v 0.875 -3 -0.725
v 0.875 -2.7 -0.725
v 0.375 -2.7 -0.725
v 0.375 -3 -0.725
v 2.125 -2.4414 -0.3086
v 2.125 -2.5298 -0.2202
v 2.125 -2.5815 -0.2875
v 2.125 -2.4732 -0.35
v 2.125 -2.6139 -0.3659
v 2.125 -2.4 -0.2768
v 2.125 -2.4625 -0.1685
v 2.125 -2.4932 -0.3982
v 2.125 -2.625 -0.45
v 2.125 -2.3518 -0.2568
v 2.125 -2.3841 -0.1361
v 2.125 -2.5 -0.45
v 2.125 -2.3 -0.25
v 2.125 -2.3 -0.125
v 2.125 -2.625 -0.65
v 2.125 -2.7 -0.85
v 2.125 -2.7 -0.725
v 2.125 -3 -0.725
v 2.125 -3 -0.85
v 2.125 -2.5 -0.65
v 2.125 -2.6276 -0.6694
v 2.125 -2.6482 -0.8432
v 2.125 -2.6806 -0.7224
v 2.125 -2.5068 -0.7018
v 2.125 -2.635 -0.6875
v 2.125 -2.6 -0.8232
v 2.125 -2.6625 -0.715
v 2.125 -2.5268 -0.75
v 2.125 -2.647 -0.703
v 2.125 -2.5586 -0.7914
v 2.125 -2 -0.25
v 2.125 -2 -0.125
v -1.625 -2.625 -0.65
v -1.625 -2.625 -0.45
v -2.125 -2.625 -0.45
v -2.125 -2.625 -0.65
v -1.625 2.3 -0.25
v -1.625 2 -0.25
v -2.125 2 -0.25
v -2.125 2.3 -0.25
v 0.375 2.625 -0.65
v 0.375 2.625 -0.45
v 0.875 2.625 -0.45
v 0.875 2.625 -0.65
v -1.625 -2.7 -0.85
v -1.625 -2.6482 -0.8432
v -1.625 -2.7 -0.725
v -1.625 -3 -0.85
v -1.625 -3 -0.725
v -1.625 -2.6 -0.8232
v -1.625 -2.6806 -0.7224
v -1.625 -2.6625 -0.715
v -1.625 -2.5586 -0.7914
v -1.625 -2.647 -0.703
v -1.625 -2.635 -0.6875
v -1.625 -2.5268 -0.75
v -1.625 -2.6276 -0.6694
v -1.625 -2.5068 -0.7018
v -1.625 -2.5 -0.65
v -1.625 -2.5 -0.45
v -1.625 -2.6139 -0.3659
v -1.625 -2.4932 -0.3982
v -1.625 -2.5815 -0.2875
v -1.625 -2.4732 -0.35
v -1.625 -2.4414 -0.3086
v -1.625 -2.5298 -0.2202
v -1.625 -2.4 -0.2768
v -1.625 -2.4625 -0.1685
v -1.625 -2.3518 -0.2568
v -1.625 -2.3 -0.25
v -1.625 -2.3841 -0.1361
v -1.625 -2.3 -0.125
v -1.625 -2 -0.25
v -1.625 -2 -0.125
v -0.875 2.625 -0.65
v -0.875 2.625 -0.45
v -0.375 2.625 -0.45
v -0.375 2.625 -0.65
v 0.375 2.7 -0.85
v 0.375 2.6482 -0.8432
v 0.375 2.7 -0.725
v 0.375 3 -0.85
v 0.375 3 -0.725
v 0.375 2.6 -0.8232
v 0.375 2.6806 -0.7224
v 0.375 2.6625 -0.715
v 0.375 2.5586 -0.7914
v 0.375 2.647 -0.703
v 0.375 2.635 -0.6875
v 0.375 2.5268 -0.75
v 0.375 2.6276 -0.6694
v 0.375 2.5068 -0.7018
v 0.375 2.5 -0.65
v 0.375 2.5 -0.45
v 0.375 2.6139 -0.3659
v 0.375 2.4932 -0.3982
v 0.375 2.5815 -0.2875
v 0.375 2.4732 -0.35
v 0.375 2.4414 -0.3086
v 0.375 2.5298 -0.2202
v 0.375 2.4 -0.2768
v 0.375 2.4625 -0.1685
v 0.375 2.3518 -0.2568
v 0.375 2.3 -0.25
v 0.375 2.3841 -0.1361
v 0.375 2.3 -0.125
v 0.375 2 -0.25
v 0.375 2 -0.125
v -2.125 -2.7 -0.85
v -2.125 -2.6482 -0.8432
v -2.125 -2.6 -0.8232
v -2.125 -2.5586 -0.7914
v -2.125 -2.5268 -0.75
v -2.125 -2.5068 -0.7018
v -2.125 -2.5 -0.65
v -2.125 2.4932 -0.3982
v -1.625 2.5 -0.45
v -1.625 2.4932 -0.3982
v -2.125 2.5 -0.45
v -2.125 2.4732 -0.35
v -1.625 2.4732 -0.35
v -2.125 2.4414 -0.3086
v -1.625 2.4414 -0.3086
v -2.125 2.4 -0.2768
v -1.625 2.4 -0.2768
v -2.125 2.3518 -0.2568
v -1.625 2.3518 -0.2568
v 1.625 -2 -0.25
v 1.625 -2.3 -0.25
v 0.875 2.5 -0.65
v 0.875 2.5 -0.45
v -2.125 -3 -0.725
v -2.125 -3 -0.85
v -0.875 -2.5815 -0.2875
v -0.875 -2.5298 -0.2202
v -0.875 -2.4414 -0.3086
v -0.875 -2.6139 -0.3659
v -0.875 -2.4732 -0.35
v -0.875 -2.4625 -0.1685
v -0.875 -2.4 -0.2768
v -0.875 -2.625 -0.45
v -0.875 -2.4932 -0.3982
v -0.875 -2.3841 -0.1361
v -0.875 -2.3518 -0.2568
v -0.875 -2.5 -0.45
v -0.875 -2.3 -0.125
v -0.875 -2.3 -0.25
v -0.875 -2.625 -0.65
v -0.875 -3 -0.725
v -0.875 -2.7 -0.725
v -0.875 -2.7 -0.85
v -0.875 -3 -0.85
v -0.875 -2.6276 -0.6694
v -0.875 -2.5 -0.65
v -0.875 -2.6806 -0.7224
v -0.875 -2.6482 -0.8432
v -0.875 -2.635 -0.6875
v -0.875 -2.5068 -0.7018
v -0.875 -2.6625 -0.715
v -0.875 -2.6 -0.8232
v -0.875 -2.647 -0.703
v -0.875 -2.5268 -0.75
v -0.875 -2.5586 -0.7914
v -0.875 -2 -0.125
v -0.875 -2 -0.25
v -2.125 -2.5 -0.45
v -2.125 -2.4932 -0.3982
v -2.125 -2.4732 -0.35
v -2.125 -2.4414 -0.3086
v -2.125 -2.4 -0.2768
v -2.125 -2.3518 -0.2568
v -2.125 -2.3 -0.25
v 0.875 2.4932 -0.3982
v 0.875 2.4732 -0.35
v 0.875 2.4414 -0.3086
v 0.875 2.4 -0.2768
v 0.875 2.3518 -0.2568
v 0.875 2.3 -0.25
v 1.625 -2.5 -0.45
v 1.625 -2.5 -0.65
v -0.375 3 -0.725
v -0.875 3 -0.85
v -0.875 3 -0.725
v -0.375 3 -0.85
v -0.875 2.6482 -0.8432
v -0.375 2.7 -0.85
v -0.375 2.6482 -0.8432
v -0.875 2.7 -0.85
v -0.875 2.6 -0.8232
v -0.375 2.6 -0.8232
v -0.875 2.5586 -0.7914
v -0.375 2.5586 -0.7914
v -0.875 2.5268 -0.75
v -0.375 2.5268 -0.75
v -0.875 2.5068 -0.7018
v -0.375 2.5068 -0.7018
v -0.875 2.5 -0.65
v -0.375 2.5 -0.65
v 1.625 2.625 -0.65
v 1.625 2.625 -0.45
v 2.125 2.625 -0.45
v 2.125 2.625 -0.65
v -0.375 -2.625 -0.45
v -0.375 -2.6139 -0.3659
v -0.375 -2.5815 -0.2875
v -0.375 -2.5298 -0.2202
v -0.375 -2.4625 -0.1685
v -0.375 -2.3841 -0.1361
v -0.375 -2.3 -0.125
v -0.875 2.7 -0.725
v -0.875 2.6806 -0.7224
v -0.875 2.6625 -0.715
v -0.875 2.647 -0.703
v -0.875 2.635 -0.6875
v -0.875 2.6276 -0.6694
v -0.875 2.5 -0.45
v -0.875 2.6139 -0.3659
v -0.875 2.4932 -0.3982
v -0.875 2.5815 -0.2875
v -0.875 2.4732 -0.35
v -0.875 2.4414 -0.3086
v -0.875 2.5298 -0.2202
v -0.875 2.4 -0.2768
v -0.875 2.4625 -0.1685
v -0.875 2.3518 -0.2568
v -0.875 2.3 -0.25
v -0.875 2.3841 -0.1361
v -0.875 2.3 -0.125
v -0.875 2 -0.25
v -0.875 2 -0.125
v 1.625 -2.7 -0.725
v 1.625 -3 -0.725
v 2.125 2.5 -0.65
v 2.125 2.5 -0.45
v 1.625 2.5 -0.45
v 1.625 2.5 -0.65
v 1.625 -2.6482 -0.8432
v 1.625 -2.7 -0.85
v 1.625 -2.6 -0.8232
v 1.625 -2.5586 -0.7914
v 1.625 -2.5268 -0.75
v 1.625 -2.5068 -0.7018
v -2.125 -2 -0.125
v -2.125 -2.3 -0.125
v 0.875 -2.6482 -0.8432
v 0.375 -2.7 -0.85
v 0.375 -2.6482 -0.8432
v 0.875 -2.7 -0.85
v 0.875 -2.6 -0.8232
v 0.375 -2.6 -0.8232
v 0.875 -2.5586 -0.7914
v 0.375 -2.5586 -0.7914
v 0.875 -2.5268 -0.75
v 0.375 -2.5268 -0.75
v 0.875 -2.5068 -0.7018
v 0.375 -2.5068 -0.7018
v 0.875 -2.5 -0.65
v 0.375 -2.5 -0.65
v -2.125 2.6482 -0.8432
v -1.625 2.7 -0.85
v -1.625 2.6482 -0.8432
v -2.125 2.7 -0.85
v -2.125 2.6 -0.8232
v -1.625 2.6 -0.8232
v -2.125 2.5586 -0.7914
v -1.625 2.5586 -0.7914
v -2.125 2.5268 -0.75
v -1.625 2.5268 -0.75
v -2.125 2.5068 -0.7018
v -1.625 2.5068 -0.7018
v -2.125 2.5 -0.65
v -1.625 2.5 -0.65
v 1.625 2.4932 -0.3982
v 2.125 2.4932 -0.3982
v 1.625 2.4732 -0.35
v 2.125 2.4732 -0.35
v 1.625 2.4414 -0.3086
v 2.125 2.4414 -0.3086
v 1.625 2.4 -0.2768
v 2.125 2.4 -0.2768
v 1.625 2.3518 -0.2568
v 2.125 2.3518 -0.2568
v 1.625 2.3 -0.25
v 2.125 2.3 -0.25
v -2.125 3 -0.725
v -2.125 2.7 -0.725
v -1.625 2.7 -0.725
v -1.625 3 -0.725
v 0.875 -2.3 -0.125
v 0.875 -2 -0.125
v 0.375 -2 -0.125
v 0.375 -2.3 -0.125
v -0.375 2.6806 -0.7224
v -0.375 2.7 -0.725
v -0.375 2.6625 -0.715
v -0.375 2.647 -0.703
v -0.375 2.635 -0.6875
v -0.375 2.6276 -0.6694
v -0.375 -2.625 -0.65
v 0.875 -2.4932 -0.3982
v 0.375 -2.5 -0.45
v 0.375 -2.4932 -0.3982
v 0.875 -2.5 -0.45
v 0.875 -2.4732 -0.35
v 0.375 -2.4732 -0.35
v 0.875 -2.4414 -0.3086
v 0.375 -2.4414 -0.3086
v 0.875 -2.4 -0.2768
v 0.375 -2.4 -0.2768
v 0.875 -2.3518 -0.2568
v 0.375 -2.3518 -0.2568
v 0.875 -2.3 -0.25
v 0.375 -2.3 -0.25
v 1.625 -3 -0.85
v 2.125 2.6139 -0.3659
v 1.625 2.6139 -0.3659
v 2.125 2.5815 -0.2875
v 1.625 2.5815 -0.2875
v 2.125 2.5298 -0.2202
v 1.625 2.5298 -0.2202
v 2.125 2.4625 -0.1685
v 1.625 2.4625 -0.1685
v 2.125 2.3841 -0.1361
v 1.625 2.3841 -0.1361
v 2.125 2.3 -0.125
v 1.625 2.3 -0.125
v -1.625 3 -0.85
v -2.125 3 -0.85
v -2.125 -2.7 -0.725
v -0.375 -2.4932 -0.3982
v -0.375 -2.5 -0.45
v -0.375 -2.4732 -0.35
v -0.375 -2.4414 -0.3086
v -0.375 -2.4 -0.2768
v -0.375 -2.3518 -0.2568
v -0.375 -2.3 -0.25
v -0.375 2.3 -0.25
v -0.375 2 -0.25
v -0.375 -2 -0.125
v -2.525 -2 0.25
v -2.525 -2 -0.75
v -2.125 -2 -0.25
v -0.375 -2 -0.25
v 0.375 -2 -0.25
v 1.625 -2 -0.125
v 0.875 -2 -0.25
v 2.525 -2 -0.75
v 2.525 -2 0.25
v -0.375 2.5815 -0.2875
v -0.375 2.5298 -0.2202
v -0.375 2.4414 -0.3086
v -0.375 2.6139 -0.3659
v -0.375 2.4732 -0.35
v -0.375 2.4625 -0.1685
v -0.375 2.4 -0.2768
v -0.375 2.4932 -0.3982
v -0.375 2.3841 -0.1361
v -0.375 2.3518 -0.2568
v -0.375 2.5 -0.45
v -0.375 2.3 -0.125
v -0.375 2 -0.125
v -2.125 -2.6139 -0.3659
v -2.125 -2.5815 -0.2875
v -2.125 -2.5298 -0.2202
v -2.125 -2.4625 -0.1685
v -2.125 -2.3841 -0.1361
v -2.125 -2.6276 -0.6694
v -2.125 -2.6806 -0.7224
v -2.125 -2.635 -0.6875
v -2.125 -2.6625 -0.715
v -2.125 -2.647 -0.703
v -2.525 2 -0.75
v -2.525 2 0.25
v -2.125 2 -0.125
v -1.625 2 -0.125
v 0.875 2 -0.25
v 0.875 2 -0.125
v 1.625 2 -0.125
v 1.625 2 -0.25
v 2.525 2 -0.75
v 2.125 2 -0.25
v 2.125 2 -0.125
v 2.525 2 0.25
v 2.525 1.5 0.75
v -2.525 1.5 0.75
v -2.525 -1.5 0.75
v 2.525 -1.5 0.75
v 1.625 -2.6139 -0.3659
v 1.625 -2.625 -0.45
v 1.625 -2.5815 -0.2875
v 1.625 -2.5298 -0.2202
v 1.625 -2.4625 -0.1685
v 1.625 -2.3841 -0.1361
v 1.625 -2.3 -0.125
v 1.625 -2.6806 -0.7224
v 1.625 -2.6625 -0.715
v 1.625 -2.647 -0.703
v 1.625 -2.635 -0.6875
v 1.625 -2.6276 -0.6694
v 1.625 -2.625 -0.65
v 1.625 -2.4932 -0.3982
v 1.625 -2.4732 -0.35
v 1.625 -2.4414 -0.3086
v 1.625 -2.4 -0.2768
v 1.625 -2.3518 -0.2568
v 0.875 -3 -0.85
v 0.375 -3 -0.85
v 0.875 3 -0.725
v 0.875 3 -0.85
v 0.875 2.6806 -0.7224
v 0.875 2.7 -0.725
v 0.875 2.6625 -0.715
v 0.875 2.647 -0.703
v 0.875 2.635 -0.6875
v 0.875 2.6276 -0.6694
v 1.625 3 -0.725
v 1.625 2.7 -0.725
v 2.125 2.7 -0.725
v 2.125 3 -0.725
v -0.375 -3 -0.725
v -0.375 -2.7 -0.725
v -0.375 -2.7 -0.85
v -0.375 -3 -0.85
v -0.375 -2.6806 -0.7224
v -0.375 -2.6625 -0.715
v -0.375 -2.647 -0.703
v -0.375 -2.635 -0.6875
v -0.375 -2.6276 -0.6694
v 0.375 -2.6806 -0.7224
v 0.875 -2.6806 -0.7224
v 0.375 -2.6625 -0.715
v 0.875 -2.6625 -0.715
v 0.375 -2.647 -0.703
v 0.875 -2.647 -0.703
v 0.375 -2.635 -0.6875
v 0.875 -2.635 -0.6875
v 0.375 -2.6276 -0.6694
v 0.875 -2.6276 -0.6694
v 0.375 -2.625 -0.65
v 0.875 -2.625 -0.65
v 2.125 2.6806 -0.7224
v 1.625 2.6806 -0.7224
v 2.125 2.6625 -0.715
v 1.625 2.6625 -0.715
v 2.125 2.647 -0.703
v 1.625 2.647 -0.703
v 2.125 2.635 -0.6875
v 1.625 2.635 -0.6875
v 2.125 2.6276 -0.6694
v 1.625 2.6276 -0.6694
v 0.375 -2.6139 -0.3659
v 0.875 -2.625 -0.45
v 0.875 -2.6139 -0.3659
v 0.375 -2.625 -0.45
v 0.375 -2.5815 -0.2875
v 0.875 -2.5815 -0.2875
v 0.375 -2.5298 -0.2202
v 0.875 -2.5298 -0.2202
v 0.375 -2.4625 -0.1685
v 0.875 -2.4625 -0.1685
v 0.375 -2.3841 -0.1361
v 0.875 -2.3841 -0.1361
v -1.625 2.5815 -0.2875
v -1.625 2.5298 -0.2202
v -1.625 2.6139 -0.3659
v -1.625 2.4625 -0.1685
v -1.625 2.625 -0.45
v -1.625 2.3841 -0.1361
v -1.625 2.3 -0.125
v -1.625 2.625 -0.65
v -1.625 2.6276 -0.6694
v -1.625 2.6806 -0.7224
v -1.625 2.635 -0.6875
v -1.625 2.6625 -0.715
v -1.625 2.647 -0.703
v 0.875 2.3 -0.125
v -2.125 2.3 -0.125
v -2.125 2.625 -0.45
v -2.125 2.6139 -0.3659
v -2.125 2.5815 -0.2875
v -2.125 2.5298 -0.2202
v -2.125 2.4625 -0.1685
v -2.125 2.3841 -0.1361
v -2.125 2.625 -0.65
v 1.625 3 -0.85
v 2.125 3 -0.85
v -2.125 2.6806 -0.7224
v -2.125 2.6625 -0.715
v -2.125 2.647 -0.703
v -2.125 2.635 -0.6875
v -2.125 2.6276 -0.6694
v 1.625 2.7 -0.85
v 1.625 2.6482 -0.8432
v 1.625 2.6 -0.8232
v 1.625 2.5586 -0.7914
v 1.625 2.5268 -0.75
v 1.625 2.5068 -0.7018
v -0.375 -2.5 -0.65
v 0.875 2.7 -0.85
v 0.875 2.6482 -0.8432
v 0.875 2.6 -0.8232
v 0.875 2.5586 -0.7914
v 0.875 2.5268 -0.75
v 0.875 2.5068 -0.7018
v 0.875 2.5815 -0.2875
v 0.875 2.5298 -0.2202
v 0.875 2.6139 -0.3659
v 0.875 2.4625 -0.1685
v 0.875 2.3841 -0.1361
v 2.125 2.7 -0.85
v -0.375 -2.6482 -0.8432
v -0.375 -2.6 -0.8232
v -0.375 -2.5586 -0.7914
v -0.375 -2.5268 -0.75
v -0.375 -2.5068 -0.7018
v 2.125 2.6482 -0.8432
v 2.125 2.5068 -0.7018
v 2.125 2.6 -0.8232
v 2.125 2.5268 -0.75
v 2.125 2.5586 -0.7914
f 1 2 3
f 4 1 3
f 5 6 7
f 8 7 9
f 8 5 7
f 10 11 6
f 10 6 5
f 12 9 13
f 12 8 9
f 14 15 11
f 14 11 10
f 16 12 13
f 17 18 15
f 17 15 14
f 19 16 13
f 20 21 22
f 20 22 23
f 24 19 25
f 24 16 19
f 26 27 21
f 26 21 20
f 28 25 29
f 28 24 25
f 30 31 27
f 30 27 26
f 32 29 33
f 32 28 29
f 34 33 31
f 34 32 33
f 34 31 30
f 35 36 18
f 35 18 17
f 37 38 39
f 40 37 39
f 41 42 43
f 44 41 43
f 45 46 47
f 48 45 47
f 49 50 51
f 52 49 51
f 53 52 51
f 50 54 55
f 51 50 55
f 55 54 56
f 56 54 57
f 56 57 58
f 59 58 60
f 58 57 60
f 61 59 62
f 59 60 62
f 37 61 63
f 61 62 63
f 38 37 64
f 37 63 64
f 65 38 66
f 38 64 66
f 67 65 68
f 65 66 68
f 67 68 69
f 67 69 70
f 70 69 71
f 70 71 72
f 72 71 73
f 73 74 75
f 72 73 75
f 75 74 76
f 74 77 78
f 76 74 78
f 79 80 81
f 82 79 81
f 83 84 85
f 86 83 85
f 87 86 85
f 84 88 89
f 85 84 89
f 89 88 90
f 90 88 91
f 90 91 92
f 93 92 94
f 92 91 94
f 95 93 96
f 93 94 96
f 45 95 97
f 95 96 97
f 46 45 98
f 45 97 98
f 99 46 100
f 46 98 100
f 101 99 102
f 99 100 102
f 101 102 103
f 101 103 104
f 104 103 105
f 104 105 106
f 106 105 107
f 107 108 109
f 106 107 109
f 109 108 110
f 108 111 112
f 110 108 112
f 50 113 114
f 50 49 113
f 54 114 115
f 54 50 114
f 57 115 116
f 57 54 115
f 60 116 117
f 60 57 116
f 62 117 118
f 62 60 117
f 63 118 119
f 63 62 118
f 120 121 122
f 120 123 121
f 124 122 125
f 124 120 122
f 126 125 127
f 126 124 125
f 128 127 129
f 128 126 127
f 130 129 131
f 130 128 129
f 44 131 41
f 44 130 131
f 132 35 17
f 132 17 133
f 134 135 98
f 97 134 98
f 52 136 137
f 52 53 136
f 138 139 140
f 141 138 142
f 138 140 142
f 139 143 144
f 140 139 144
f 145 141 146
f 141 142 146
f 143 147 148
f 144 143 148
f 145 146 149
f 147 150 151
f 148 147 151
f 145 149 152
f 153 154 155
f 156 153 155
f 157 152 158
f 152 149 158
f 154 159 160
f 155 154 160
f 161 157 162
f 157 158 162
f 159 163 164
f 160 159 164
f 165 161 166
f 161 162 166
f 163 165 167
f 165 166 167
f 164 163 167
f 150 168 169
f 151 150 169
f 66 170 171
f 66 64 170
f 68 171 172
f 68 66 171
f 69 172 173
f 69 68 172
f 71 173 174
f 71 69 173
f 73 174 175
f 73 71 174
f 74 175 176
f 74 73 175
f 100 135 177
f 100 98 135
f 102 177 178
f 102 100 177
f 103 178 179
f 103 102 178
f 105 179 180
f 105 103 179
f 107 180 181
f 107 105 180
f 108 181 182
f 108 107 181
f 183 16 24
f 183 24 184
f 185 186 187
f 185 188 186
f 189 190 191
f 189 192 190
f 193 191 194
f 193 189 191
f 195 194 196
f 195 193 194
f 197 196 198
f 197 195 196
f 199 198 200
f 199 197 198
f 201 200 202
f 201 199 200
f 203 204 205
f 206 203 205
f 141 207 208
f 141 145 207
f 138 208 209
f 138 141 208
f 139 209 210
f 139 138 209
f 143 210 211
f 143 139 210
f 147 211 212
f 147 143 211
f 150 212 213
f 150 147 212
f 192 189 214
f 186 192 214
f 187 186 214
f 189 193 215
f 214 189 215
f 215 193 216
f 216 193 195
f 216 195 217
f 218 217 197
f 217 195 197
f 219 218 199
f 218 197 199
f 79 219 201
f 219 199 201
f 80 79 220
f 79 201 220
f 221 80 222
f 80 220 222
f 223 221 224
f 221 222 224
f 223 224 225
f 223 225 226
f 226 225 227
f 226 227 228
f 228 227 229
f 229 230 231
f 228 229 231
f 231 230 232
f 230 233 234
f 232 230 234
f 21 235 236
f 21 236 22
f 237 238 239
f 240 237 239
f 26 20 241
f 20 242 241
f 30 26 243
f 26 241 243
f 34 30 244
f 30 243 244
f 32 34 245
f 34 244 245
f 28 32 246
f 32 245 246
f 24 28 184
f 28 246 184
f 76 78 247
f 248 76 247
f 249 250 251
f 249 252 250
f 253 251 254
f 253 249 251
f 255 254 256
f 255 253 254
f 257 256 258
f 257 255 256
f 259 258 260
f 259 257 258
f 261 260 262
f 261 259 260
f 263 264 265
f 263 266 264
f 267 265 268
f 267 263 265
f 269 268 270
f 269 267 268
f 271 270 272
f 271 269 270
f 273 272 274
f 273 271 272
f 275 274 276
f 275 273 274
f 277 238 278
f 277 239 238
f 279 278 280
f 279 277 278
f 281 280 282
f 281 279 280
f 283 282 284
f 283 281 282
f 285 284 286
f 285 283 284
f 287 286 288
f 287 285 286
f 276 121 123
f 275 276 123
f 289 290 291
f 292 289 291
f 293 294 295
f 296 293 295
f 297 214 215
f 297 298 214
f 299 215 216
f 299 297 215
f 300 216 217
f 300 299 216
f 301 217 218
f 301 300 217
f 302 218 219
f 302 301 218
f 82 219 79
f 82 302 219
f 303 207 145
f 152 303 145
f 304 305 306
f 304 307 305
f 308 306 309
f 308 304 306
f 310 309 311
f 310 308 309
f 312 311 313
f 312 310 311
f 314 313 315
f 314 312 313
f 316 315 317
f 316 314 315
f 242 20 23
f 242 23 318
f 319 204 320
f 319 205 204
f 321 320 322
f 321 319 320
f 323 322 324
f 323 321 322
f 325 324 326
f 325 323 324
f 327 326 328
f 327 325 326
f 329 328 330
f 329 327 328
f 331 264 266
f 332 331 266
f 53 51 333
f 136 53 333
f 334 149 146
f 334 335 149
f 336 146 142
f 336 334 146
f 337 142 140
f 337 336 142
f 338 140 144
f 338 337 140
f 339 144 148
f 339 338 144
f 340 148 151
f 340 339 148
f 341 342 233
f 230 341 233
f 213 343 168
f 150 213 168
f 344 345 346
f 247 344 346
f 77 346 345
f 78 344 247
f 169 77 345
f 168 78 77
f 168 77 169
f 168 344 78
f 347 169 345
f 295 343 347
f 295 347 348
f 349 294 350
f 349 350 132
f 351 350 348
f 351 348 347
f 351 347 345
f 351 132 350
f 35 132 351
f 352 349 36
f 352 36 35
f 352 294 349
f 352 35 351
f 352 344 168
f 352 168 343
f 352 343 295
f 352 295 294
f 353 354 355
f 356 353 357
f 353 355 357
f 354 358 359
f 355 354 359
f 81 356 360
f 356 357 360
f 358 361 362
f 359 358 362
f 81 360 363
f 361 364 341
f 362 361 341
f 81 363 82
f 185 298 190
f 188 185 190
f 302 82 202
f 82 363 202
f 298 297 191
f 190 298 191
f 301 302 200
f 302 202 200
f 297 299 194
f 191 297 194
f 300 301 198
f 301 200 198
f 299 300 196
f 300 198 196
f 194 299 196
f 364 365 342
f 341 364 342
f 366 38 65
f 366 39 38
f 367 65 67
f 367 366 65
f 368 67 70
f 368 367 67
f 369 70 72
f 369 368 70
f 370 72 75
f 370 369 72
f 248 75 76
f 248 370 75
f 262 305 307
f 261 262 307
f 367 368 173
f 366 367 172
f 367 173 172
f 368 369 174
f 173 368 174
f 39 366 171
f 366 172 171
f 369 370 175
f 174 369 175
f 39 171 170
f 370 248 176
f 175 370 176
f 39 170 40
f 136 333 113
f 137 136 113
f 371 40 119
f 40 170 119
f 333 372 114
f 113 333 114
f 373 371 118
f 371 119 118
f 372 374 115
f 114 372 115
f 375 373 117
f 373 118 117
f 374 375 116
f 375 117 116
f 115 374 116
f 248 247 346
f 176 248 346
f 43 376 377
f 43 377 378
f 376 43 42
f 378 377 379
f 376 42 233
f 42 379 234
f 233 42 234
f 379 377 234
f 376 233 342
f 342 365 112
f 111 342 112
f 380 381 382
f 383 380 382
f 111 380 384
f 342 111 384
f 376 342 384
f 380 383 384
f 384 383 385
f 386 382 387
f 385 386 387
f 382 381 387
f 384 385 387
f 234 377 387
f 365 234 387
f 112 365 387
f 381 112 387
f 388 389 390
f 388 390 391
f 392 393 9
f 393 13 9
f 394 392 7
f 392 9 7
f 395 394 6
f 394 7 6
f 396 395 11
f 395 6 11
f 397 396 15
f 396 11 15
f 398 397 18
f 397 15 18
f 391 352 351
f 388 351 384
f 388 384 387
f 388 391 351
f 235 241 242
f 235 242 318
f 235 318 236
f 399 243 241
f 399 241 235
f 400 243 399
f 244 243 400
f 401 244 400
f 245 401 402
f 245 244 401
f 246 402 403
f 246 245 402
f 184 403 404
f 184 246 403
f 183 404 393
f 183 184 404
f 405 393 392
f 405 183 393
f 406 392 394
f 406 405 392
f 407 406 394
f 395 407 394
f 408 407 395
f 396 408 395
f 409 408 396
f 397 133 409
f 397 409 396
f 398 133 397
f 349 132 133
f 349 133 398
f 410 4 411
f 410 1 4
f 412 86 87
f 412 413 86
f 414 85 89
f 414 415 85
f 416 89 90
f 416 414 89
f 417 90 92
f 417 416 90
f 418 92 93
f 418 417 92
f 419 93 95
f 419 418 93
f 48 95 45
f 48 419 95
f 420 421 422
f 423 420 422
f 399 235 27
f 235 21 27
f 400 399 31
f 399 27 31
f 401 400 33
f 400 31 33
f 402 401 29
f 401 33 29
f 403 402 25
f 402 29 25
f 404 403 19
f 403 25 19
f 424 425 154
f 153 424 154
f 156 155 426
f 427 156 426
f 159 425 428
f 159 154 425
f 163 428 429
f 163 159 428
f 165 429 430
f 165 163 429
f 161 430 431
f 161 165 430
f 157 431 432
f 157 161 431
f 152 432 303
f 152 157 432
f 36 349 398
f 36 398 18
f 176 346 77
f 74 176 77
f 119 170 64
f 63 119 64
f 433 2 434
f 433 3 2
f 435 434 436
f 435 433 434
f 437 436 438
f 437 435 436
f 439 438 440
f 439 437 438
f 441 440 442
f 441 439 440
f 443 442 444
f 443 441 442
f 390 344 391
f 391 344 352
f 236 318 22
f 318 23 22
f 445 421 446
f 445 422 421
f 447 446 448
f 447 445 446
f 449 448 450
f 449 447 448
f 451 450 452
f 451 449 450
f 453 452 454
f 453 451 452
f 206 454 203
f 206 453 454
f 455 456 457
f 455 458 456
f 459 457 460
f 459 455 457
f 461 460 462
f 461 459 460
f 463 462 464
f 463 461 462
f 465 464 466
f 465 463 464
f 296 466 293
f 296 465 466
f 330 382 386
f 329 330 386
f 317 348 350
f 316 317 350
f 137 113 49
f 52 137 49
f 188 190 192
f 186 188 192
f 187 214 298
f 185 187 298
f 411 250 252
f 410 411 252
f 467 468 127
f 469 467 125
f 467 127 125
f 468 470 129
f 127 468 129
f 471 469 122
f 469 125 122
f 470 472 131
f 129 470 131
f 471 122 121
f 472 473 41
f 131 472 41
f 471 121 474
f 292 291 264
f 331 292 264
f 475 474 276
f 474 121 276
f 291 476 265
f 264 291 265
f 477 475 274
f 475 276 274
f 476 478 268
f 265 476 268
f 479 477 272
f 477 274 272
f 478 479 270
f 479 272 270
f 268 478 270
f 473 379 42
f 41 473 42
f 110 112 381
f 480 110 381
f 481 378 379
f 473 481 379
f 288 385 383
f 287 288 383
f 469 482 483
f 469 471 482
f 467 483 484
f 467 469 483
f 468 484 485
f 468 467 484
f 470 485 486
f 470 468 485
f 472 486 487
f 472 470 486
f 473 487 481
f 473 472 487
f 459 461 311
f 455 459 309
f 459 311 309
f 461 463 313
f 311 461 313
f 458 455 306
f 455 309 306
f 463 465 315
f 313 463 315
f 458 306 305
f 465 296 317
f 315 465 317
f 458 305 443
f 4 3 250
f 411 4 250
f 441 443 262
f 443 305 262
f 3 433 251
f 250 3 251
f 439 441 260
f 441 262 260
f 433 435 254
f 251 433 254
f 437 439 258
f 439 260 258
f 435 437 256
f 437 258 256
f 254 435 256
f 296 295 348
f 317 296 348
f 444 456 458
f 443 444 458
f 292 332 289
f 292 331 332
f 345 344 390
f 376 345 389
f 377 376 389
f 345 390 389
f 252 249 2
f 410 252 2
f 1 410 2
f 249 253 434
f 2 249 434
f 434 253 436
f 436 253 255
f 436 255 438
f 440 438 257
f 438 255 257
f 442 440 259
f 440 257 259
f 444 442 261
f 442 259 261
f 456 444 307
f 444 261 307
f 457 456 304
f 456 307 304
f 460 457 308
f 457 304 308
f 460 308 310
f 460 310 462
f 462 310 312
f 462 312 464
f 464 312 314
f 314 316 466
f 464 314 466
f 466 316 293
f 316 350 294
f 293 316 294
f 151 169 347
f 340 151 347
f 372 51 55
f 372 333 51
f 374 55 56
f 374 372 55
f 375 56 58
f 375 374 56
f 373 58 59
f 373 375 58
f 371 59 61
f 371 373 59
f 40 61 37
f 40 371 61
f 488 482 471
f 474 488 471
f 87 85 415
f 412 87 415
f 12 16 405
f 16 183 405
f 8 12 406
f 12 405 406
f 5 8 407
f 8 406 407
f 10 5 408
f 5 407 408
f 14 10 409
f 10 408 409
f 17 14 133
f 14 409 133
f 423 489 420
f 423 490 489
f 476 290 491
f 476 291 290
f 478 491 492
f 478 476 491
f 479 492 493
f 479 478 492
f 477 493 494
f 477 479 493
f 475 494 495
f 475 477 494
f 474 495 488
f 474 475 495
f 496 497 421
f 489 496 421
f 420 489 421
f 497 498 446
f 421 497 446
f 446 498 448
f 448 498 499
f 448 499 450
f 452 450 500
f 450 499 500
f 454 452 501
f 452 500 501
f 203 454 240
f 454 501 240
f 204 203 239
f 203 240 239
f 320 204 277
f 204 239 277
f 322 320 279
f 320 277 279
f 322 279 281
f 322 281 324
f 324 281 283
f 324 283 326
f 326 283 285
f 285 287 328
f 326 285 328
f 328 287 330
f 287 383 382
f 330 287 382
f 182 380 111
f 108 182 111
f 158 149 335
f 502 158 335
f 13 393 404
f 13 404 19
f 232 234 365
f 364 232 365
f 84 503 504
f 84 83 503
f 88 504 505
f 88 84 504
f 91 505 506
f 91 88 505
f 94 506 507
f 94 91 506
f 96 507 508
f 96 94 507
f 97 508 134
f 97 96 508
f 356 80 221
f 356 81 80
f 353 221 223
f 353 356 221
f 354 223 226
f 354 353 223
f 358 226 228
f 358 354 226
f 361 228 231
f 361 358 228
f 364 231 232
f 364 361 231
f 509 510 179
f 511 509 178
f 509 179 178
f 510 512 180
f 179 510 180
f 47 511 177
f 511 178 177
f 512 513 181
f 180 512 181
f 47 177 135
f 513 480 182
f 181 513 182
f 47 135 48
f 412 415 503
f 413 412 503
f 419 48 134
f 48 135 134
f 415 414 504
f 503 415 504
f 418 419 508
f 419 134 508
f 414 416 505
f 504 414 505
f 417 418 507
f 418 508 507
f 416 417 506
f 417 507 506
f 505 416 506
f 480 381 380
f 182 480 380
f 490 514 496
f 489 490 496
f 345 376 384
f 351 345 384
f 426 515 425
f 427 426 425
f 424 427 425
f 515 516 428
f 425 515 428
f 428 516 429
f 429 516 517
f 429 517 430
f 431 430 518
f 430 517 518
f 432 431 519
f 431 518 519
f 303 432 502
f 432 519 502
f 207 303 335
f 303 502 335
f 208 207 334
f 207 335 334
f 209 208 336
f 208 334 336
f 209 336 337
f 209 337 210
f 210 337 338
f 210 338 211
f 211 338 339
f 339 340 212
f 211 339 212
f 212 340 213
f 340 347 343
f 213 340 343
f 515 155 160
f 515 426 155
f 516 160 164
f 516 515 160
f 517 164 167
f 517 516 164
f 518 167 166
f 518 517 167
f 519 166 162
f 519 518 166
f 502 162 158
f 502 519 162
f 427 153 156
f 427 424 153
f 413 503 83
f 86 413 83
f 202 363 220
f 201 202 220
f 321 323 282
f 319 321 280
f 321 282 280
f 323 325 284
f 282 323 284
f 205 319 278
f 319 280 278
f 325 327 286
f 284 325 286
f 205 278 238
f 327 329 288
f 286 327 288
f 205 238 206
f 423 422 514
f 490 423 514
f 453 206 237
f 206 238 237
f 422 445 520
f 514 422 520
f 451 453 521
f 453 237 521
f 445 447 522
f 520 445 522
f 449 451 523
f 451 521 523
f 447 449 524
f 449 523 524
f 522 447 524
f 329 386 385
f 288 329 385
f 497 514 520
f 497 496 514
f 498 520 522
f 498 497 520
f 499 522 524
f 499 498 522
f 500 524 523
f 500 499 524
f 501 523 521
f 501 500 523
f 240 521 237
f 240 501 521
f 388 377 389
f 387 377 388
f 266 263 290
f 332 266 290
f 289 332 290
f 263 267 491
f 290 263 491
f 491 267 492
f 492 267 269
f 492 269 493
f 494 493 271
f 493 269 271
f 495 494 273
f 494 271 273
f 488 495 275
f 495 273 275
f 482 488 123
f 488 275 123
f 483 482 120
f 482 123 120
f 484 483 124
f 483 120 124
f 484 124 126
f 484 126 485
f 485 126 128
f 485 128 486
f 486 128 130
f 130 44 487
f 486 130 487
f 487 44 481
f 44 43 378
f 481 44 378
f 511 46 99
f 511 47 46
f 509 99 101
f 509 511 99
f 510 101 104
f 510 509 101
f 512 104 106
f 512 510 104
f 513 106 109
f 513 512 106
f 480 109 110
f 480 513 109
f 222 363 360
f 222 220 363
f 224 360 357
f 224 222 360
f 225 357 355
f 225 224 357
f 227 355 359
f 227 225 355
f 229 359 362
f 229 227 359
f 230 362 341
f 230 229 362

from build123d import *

# Parameters (mm, degrees)
SKETCH1_W               = 5.05
SKETCH1_H               = 4
EXTRUDE1_DEPTH          = 0.75
CHAMFER1_SIZE           = 0.5
SKETCH2_W               = 0.5
SKETCH2_H               = 0.125
LPATTERN1_COUNT         = 4
LPATTERN1_PITCH         = 1.25
MIRROR1_COPY_1_SKETCH_W = 0.5
MIRROR1_COPY_1_SKETCH_H = 0.125
MIRROR1_COPY_2_SKETCH_W = 0.5
MIRROR1_COPY_2_SKETCH_H = 0.125
MIRROR1_COPY_3_SKETCH_W = 0.5
MIRROR1_COPY_3_SKETCH_H = 0.125


with BuildPart() as part:
    # Sketch1 → Extrude1 (new, symmetric)
    with BuildSketch(Plane.XY):
        Rectangle(SKETCH1_W, SKETCH1_H)
    extrude(amount=EXTRUDE1_DEPTH, both=True)

    # Chamfer1
    chamfer1_edges = [part.edges().sort_by_distance(p)[0] for p in [
        (0, -2, 0.75),
        (0, 2, 0.75),
    ]]
    chamfer(chamfer1_edges, length=CHAMFER1_SIZE)

    # Sweep1: sweep along a path in Sketch3
    with BuildLine(Plane(origin=(2.125, 0, 0), x_dir=(0, 0, -1), z_dir=(1, 0, 0))) as sweep1_path:
        Line((0.85, 3), (0.85, 2.7))
        ThreePointArc((0.85, 2.7), (0.791421356, 2.558578644), (0.65, 2.5))
        Line((0.65, 2.5), (0.45, 2.5))
        ThreePointArc((0.45, 2.5), (0.308578644, 2.441421356), (0.25, 2.3))
        Line((0.25, 2.3), (0.25, 2))
    # Sketch2 → Sweep1 (sweep)
    with BuildSketch(Plane(origin=(0, 2, 0), x_dir=(1, 0, 0), z_dir=(0, 1, 0))):
        with Locations((1.875, 0.1875)):
            Rectangle(SKETCH2_W, SKETCH2_H)
    sweep1 = sweep(path=sweep1_path.line)

    # LPattern1: Sweep1 ×4
    with Locations(*[(-i * LPATTERN1_PITCH, 0, 0) for i in range(1, LPATTERN1_COUNT)]):
        add(sweep1)

    # Mirror1: Sweep1 across plane
    add(sweep1.mirror(Plane.ZX))

    # Mirror1 copy 1: sweep along a path in Mirror1 copy 1 path
    with BuildLine(Plane(origin=(0.875, 0, 0), x_dir=(0, 0, -1), z_dir=(1, 0, 0))) as mirror1_copy_1_path:
        Line((0.85, -3), (0.85, -2.7))
        ThreePointArc((0.85, -2.7), (0.791421356, -2.558578644), (0.65, -2.5))
        Line((0.65, -2.5), (0.45, -2.5))
        ThreePointArc((0.45, -2.5), (0.308578644, -2.441421356), (0.25, -2.3))
        Line((0.25, -2.3), (0.25, -2))
    # Mirror1 copy 1 sketch → Mirror1 copy 1 (sweep)
    with BuildSketch(Plane(origin=(-1.25, -2, 0), x_dir=(1, 0, 0), z_dir=(0, -1, 0))):
        with Locations((1.875, -0.1875)):
            Rectangle(MIRROR1_COPY_1_SKETCH_W, MIRROR1_COPY_1_SKETCH_H)
    sweep(path=mirror1_copy_1_path.line)

    # Mirror1 copy 2: sweep along a path in Mirror1 copy 2 path
    with BuildLine(Plane(origin=(-0.375, 0, 0), x_dir=(0, 0, -1), z_dir=(1, 0, 0))) as mirror1_copy_2_path:
        Line((0.85, -3), (0.85, -2.7))
        ThreePointArc((0.85, -2.7), (0.791421356, -2.558578644), (0.65, -2.5))
        Line((0.65, -2.5), (0.45, -2.5))
        ThreePointArc((0.45, -2.5), (0.308578644, -2.441421356), (0.25, -2.3))
        Line((0.25, -2.3), (0.25, -2))
    # Mirror1 copy 2 sketch → Mirror1 copy 2 (sweep)
    with BuildSketch(Plane(origin=(-2.5, -2, 0), x_dir=(1, 0, 0), z_dir=(0, -1, 0))):
        with Locations((1.875, -0.1875)):
            Rectangle(MIRROR1_COPY_2_SKETCH_W, MIRROR1_COPY_2_SKETCH_H)
    sweep(path=mirror1_copy_2_path.line)

    # Mirror1 copy 3: sweep along a path in Mirror1 copy 3 path
    with BuildLine(Plane(origin=(-1.625, 0, 0), x_dir=(0, 0, -1), z_dir=(1, 0, 0))) as mirror1_copy_3_path:
        Line((0.85, -3), (0.85, -2.7))
        ThreePointArc((0.85, -2.7), (0.791421356, -2.558578644), (0.65, -2.5))
        Line((0.65, -2.5), (0.45, -2.5))
        ThreePointArc((0.45, -2.5), (0.308578644, -2.441421356), (0.25, -2.3))
        Line((0.25, -2.3), (0.25, -2))
    # Mirror1 copy 3 sketch → Mirror1 copy 3 (sweep)
    with BuildSketch(Plane(origin=(-3.75, -2, 0), x_dir=(1, 0, 0), z_dir=(0, -1, 0))):
        with Locations((1.875, -0.1875)):
            Rectangle(MIRROR1_COPY_3_SKETCH_W, MIRROR1_COPY_3_SKETCH_H)
    sweep(path=mirror1_copy_3_path.line)


solid = part.part
